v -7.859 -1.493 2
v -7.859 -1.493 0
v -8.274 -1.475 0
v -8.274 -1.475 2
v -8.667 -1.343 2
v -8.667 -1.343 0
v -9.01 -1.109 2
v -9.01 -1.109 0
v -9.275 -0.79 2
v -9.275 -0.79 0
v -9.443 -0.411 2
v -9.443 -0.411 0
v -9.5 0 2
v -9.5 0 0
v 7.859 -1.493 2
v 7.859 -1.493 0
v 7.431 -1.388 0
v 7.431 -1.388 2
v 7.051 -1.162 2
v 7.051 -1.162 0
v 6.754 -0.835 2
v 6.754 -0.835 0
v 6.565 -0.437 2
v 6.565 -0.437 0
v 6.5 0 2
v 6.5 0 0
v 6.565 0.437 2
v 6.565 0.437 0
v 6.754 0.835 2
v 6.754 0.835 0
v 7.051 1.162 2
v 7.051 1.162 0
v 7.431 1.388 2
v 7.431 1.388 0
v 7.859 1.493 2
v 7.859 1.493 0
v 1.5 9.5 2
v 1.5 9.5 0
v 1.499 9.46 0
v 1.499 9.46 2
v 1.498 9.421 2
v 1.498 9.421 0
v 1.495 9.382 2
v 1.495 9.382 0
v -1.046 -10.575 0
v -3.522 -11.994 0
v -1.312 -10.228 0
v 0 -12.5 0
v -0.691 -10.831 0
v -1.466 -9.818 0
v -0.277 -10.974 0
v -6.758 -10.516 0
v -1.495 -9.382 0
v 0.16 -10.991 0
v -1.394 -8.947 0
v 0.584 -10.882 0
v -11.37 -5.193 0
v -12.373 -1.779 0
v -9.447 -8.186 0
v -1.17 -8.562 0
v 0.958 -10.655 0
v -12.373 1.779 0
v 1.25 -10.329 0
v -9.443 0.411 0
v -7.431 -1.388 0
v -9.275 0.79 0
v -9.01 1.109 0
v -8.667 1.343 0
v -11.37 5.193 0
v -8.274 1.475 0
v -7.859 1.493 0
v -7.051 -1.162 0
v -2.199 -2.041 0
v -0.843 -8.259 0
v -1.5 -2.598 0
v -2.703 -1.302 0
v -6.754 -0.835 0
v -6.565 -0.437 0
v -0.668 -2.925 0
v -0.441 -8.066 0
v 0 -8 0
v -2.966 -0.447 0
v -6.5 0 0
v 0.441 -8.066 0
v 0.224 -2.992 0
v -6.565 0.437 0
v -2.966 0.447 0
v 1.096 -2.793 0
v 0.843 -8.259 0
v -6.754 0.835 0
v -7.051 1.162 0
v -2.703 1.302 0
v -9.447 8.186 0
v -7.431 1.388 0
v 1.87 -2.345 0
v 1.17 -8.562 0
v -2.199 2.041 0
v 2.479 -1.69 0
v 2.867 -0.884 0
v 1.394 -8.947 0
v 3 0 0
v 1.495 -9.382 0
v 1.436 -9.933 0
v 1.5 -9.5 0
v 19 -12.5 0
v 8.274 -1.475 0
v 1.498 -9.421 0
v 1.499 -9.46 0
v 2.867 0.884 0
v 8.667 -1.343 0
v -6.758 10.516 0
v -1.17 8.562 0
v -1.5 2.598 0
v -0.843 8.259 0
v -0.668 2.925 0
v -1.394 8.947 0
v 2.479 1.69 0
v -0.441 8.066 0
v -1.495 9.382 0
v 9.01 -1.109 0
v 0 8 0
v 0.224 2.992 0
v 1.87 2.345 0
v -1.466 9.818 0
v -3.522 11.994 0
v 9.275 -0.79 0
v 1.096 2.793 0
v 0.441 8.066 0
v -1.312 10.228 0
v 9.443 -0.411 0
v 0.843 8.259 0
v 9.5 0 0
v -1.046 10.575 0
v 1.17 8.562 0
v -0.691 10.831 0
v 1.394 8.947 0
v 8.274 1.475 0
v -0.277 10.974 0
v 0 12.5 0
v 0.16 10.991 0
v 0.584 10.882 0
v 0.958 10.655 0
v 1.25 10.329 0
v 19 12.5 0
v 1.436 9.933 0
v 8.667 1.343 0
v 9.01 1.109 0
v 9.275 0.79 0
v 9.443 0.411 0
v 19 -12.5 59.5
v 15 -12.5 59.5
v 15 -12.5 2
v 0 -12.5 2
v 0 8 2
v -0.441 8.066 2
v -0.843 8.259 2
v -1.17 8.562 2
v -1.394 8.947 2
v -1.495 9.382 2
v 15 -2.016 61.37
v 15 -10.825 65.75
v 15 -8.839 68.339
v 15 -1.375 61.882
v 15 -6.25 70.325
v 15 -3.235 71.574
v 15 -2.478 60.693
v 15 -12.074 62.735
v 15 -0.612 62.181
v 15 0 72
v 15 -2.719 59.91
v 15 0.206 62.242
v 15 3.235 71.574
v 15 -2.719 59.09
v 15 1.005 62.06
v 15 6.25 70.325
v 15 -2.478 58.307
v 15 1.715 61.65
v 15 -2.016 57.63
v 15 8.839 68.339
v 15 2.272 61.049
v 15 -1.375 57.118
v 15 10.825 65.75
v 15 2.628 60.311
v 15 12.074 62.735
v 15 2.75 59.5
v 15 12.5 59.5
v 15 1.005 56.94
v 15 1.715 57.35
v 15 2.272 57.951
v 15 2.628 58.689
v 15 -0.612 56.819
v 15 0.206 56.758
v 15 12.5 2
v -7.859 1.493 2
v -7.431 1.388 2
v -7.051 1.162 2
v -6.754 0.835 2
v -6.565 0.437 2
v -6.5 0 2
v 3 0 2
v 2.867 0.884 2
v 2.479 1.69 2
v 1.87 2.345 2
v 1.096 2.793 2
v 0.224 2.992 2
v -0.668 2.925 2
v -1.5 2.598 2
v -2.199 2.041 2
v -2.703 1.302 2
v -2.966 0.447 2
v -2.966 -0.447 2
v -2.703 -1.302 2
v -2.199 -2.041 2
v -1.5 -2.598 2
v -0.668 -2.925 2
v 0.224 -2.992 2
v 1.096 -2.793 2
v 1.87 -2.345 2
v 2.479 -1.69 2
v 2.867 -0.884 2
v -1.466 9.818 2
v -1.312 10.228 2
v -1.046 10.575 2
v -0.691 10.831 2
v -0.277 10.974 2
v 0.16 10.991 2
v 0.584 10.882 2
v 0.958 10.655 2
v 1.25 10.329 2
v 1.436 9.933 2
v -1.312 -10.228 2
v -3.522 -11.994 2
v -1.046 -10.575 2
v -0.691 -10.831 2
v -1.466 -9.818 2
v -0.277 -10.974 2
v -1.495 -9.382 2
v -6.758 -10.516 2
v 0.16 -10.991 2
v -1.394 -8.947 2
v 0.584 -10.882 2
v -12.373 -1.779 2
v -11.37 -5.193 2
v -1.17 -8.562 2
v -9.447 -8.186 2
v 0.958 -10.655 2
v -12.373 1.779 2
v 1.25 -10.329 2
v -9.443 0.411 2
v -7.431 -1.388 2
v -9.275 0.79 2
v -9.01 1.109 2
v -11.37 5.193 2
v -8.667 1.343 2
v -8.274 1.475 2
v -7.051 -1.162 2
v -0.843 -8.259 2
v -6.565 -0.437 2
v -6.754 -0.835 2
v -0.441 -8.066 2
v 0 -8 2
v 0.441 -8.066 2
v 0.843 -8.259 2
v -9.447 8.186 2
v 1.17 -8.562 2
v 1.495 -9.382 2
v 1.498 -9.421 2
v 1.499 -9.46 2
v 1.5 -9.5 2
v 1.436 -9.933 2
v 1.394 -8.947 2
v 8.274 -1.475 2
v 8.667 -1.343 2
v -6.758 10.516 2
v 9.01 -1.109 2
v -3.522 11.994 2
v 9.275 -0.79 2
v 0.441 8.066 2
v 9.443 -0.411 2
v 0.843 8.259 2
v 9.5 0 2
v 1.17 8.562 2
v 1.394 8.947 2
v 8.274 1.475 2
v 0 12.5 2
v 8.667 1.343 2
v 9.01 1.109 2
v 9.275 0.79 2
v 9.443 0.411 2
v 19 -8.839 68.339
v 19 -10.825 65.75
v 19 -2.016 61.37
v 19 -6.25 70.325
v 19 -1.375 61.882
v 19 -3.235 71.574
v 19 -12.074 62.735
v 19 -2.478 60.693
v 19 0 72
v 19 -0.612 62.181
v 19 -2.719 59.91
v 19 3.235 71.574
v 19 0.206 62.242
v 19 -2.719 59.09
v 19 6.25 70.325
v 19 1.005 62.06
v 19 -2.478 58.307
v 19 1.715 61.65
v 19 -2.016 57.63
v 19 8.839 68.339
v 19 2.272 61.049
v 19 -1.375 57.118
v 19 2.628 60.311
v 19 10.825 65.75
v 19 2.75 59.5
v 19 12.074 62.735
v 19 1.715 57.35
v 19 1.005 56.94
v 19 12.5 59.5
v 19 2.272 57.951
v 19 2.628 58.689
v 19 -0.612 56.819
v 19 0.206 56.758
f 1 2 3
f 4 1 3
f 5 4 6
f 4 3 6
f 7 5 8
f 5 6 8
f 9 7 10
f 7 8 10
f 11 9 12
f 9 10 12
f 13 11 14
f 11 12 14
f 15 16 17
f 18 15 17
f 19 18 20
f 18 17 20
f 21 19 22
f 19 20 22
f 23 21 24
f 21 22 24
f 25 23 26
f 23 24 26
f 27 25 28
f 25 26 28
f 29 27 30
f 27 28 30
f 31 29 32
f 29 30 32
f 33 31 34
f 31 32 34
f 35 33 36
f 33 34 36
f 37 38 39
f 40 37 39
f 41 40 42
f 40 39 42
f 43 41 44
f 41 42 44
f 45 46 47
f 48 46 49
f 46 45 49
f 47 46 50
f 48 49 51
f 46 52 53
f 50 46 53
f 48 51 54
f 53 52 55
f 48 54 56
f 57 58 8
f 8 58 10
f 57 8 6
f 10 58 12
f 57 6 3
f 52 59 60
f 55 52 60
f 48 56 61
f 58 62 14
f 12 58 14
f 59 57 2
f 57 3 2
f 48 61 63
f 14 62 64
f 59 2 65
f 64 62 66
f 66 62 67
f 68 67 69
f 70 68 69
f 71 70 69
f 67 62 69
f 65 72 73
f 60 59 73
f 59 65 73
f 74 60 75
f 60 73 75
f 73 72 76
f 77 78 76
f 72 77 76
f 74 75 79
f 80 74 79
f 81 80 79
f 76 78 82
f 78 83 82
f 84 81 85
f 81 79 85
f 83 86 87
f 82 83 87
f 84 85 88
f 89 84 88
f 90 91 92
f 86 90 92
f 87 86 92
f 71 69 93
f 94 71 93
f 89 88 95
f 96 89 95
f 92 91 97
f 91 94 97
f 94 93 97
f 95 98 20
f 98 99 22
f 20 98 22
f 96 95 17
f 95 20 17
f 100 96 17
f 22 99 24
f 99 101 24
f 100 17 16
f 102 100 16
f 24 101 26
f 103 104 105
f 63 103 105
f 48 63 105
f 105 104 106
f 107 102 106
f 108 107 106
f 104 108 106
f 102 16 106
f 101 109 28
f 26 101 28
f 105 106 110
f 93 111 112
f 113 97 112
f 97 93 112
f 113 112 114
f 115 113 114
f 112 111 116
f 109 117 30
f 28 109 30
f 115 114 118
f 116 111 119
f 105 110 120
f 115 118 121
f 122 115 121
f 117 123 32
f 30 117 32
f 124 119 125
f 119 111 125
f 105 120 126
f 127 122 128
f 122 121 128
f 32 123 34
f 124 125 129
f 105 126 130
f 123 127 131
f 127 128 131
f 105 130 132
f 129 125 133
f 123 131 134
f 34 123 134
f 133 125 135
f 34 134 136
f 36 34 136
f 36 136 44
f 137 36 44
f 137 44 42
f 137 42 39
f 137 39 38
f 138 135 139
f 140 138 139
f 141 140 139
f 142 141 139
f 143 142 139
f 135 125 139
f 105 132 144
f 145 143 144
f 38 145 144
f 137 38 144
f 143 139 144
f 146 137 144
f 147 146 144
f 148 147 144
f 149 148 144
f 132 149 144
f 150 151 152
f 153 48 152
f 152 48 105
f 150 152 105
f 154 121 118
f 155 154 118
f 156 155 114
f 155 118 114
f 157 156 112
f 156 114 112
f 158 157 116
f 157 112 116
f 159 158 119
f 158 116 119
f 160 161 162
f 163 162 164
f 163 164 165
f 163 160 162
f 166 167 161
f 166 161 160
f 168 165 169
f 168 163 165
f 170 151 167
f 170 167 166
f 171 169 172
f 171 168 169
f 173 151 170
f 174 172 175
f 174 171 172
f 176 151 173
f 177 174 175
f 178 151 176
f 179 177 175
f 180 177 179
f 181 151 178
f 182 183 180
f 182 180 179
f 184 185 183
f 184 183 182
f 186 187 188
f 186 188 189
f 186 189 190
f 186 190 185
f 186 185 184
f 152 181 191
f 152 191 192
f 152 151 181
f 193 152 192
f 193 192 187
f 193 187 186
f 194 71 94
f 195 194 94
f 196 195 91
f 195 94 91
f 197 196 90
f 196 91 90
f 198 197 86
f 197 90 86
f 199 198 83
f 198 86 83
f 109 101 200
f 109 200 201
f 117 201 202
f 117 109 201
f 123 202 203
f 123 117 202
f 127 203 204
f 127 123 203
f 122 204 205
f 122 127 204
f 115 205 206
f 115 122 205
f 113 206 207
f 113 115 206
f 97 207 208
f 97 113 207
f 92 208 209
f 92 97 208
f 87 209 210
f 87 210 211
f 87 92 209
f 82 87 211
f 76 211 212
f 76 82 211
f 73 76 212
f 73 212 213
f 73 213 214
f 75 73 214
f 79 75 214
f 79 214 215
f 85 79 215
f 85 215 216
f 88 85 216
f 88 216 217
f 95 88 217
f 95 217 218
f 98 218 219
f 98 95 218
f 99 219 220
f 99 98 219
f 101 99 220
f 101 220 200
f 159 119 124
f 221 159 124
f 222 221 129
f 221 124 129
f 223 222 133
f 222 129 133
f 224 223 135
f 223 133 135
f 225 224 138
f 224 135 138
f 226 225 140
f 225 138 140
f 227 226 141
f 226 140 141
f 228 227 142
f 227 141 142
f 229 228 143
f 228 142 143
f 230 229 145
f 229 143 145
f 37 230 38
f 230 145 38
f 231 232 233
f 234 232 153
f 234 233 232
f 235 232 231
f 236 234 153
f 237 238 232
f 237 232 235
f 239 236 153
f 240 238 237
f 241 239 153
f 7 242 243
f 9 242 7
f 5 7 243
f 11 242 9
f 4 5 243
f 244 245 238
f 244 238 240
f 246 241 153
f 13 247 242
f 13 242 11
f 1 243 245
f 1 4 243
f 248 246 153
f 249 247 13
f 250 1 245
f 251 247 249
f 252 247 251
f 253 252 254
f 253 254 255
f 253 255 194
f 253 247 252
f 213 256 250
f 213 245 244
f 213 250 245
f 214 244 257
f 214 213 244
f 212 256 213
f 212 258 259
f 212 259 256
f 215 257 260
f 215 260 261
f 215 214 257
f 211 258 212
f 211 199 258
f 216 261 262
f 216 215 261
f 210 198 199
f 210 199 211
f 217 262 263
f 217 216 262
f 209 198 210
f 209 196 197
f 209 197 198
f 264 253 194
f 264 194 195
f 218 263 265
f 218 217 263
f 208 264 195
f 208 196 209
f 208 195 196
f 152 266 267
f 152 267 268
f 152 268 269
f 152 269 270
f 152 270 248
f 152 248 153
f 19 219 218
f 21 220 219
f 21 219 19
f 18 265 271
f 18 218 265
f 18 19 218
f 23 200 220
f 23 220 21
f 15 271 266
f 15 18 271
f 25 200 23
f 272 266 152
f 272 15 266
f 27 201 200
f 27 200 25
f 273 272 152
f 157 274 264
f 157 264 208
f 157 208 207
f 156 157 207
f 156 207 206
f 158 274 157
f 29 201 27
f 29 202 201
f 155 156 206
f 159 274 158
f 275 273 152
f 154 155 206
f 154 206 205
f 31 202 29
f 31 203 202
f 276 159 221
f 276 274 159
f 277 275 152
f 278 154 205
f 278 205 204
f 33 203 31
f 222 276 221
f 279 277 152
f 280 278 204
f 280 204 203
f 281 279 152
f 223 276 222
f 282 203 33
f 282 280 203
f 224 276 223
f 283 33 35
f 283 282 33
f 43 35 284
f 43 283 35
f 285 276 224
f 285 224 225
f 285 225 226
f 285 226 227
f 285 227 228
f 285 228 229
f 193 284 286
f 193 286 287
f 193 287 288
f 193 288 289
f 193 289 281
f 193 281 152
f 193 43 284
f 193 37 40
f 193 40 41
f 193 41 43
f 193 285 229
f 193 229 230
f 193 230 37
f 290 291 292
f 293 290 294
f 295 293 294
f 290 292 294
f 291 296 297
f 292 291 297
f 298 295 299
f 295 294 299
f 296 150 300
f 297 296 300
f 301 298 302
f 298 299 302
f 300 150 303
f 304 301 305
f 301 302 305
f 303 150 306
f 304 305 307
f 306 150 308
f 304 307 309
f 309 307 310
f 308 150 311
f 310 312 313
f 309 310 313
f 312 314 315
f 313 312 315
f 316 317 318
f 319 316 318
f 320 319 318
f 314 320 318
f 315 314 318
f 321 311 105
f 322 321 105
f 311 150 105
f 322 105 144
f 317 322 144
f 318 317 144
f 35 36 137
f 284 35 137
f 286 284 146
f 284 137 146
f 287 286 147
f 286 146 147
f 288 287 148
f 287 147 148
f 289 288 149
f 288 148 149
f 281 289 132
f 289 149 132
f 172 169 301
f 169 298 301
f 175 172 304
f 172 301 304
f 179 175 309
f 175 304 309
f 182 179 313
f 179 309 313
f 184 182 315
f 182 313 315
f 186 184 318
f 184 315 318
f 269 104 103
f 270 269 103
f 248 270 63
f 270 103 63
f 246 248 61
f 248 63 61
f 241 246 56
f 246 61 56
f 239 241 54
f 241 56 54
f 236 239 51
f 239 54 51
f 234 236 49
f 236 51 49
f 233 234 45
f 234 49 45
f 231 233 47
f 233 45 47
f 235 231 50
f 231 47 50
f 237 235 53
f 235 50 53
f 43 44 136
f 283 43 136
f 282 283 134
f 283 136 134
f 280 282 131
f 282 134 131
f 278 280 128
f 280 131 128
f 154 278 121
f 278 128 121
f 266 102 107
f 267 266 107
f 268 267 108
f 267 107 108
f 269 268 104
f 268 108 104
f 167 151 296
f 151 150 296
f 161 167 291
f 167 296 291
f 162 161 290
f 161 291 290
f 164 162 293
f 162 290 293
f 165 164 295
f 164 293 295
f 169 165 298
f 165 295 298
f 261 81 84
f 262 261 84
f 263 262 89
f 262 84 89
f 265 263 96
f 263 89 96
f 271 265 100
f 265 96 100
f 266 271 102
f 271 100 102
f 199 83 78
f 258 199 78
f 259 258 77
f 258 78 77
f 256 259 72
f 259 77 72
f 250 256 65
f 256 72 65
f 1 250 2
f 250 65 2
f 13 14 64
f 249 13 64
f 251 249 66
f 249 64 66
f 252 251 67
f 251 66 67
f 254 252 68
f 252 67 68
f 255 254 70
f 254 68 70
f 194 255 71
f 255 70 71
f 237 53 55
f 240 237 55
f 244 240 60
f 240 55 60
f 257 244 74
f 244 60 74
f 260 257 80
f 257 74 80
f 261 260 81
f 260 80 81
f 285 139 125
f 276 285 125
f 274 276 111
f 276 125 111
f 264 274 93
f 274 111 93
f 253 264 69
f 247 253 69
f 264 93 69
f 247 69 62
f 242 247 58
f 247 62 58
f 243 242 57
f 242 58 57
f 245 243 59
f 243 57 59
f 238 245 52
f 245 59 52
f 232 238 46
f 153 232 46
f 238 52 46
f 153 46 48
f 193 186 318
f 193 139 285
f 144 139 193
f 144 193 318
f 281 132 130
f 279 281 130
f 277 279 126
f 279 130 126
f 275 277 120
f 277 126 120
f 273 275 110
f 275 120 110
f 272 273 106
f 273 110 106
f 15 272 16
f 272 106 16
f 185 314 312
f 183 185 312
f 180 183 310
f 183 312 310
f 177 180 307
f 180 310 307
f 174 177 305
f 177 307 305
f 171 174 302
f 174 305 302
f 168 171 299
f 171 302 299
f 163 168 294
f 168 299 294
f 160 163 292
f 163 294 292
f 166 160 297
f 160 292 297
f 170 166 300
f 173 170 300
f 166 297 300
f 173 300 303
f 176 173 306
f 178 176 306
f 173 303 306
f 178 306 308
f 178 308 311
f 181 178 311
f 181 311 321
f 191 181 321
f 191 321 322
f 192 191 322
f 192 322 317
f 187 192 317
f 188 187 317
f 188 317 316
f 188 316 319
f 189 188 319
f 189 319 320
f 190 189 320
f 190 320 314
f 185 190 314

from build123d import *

# Parameters (mm, degrees)
F0_R     = 3
F1_DEPTH = 2
F2_W     = 4
F2_H     = 25
F3_DEPTH = 70
F4_R     = 2.75
F5_DEPTH = 31.501
F6_R     = 12.49999


# Not quite as in the source:
# - a fillet or chamfer is up to 0.001 mm smaller than in the source, because OpenCascade refuses the exact size
# - a feature names something its author has since deleted; it is built from what else it names


with BuildPart() as f1:
    # F0 (on Top) → F1 (new body)
    with BuildSketch(Plane.XY):
        with BuildLine():
            ThreePointArc((0, -12.5), (8.8388347648, -8.8388347648), (12.5, 0))
            ThreePointArc((12.5, 0), (8.8388347648, 8.8388347648), (0, 12.5))
            ThreePointArc((0, 12.5), (-12.5, 0), (0, -12.5))
        make_face()
        with BuildLine():
            ThreePointArc((1.4953181783, 9.3815789474), (7.2268777039, 6.1662175321), (9.5, 0))
            ThreePointArc((9.5, 0), (7.2268777039, -6.1662175321), (1.4953181783, -9.3815789474))
            ThreePointArc((1.4953181783, -9.3815789474), (1.4988290876, -9.4407432173), (1.5, -9.5))
            ThreePointArc((1.5, -9.5), (-0.0592567827, -10.9988290876), (-1.4953181783, -9.3815789474))
            ThreePointArc((-1.4953181783, -9.3815789474), (-7.2268777039, -6.1662175321), (-9.5, 0))
            ThreePointArc((-9.5, 0), (-7.2268777039, 6.1662175321), (-1.4953181783, 9.3815789474))
            ThreePointArc((-1.4953181783, 9.3815789474), (-0.0592567827, 10.9988290876), (1.5, 9.5))
            ThreePointArc((1.5, 9.5), (1.4988290876, 9.4407432173), (1.4953181783, 9.3815789474))
        make_face(mode=Mode.SUBTRACT)
        with BuildLine():
            ThreePointArc((0, 12.5), (8.8388347648, 8.8388347648), (12.5, 0))
            ThreePointArc((12.5, 0), (8.8388347648, -8.8388347648), (0, -12.5))
            Line((0, -12.5), (19, -12.5))
            Line((19, -12.5), (19, 12.5))
            Line((19, 12.5), (0, 12.5))
        make_face()
        with BuildLine():
            ThreePointArc((7.859375, -1.4933936552), (6.5, 0), (7.859375, 1.4933936552))
            ThreePointArc((7.859375, 1.4933936552), (5.1016100823, 6.1622702446), (1.34e-08, 8))
            ThreePointArc((1.34e-08, 8), (-5.101610072, 6.1622702532), (-7.859375, 1.4933936552))
            ThreePointArc((-7.859375, 1.4933936552), (-6.8907350407, 1.0097184013), (-6.5, 0))
            ThreePointArc((-6.5, 0), (-6.8907350407, -1.0097184013), (-7.859375, -1.4933936552))
            ThreePointArc((-7.859375, -1.4933936552), (-5.1016100771, -6.1622702489), (0, -8))
            ThreePointArc((0, -8), (5.1016100771, -6.1622702489), (7.859375, -1.4933936552))
        make_face()
        Circle(F0_R, mode=Mode.SUBTRACT)
        with BuildLine():
            ThreePointArc((7.859375, 1.4933936552), (9.0097184013, 1.1092649593), (9.5, 0))
            ThreePointArc((9.5, 0), (7.2268777039, 6.1662175321), (1.4953181783, 9.3815789474))
            ThreePointArc((1.4953181783, 9.3815789474), (1.0179313437, 8.3982669201), (1.34e-08, 8))
            ThreePointArc((1.34e-08, 8), (5.1016100823, 6.1622702446), (7.859375, 1.4933936552))
        make_face()
        with BuildLine():
            ThreePointArc((1.4953181783, -9.3815789474), (7.2268777039, -6.1662175321), (9.5, 0))
            ThreePointArc((9.5, 0), (9.0097184013, -1.1092649593), (7.859375, -1.4933936552))
            ThreePointArc((7.859375, -1.4933936552), (5.1016100771, -6.1622702489), (0, -8))
            ThreePointArc((0, -8), (1.0179313388, -8.3982669155), (1.4953181783, -9.3815789474))
        make_face()
        with BuildLine():
            ThreePointArc((1.34e-08, 8), (-1.0179313339, 8.3982669109), (-1.4953181783, 9.3815789474))
            ThreePointArc((-1.4953181783, 9.3815789474), (-7.2268777039, 6.1662175321), (-9.5, 0))
            ThreePointArc((-9.5, 0), (-9.0097184013, 1.1092649593), (-7.859375, 1.4933936552))
            ThreePointArc((-7.859375, 1.4933936552), (-5.101610072, 6.1622702532), (1.34e-08, 8))
        make_face()
        with BuildLine():
            ThreePointArc((-9.5, 0), (-7.2268777039, -6.1662175321), (-1.4953181783, -9.3815789474))
            ThreePointArc((-1.4953181783, -9.3815789474), (-1.0179313388, -8.3982669155), (0, -8))
            ThreePointArc((0, -8), (-5.1016100771, -6.1622702489), (-7.859375, -1.4933936552))
            ThreePointArc((-7.859375, -1.4933936552), (-9.0097184013, -1.1092649593), (-9.5, 0))
        make_face()
    extrude(amount=F1_DEPTH)

    # F2 (on face) → F3 (join)
    with BuildSketch(Plane.XY.offset(2)):
        with Locations((17, 0)):
            Rectangle(F2_W, F2_H)
    extrude(amount=F3_DEPTH)

    # F4 (on face) → F5 (cut, through all)
    with BuildSketch(Plane.YZ.offset(19)):
        with Locations((0, 59.5)):
            Circle(F4_R)
    extrude(amount=-F5_DEPTH, mode=Mode.SUBTRACT)

    # F6 (radius 12.5 in the source; OpenCascade refuses exactly that, so slightly less here)
    f6_edges = [f1.edges().sort_by_distance(p)[0] for p in [
        (17, -12.5, 72),
        (17, 12.5, 72),
    ]]
    fillet(f6_edges, radius=F6_R)


solid = f1.part
